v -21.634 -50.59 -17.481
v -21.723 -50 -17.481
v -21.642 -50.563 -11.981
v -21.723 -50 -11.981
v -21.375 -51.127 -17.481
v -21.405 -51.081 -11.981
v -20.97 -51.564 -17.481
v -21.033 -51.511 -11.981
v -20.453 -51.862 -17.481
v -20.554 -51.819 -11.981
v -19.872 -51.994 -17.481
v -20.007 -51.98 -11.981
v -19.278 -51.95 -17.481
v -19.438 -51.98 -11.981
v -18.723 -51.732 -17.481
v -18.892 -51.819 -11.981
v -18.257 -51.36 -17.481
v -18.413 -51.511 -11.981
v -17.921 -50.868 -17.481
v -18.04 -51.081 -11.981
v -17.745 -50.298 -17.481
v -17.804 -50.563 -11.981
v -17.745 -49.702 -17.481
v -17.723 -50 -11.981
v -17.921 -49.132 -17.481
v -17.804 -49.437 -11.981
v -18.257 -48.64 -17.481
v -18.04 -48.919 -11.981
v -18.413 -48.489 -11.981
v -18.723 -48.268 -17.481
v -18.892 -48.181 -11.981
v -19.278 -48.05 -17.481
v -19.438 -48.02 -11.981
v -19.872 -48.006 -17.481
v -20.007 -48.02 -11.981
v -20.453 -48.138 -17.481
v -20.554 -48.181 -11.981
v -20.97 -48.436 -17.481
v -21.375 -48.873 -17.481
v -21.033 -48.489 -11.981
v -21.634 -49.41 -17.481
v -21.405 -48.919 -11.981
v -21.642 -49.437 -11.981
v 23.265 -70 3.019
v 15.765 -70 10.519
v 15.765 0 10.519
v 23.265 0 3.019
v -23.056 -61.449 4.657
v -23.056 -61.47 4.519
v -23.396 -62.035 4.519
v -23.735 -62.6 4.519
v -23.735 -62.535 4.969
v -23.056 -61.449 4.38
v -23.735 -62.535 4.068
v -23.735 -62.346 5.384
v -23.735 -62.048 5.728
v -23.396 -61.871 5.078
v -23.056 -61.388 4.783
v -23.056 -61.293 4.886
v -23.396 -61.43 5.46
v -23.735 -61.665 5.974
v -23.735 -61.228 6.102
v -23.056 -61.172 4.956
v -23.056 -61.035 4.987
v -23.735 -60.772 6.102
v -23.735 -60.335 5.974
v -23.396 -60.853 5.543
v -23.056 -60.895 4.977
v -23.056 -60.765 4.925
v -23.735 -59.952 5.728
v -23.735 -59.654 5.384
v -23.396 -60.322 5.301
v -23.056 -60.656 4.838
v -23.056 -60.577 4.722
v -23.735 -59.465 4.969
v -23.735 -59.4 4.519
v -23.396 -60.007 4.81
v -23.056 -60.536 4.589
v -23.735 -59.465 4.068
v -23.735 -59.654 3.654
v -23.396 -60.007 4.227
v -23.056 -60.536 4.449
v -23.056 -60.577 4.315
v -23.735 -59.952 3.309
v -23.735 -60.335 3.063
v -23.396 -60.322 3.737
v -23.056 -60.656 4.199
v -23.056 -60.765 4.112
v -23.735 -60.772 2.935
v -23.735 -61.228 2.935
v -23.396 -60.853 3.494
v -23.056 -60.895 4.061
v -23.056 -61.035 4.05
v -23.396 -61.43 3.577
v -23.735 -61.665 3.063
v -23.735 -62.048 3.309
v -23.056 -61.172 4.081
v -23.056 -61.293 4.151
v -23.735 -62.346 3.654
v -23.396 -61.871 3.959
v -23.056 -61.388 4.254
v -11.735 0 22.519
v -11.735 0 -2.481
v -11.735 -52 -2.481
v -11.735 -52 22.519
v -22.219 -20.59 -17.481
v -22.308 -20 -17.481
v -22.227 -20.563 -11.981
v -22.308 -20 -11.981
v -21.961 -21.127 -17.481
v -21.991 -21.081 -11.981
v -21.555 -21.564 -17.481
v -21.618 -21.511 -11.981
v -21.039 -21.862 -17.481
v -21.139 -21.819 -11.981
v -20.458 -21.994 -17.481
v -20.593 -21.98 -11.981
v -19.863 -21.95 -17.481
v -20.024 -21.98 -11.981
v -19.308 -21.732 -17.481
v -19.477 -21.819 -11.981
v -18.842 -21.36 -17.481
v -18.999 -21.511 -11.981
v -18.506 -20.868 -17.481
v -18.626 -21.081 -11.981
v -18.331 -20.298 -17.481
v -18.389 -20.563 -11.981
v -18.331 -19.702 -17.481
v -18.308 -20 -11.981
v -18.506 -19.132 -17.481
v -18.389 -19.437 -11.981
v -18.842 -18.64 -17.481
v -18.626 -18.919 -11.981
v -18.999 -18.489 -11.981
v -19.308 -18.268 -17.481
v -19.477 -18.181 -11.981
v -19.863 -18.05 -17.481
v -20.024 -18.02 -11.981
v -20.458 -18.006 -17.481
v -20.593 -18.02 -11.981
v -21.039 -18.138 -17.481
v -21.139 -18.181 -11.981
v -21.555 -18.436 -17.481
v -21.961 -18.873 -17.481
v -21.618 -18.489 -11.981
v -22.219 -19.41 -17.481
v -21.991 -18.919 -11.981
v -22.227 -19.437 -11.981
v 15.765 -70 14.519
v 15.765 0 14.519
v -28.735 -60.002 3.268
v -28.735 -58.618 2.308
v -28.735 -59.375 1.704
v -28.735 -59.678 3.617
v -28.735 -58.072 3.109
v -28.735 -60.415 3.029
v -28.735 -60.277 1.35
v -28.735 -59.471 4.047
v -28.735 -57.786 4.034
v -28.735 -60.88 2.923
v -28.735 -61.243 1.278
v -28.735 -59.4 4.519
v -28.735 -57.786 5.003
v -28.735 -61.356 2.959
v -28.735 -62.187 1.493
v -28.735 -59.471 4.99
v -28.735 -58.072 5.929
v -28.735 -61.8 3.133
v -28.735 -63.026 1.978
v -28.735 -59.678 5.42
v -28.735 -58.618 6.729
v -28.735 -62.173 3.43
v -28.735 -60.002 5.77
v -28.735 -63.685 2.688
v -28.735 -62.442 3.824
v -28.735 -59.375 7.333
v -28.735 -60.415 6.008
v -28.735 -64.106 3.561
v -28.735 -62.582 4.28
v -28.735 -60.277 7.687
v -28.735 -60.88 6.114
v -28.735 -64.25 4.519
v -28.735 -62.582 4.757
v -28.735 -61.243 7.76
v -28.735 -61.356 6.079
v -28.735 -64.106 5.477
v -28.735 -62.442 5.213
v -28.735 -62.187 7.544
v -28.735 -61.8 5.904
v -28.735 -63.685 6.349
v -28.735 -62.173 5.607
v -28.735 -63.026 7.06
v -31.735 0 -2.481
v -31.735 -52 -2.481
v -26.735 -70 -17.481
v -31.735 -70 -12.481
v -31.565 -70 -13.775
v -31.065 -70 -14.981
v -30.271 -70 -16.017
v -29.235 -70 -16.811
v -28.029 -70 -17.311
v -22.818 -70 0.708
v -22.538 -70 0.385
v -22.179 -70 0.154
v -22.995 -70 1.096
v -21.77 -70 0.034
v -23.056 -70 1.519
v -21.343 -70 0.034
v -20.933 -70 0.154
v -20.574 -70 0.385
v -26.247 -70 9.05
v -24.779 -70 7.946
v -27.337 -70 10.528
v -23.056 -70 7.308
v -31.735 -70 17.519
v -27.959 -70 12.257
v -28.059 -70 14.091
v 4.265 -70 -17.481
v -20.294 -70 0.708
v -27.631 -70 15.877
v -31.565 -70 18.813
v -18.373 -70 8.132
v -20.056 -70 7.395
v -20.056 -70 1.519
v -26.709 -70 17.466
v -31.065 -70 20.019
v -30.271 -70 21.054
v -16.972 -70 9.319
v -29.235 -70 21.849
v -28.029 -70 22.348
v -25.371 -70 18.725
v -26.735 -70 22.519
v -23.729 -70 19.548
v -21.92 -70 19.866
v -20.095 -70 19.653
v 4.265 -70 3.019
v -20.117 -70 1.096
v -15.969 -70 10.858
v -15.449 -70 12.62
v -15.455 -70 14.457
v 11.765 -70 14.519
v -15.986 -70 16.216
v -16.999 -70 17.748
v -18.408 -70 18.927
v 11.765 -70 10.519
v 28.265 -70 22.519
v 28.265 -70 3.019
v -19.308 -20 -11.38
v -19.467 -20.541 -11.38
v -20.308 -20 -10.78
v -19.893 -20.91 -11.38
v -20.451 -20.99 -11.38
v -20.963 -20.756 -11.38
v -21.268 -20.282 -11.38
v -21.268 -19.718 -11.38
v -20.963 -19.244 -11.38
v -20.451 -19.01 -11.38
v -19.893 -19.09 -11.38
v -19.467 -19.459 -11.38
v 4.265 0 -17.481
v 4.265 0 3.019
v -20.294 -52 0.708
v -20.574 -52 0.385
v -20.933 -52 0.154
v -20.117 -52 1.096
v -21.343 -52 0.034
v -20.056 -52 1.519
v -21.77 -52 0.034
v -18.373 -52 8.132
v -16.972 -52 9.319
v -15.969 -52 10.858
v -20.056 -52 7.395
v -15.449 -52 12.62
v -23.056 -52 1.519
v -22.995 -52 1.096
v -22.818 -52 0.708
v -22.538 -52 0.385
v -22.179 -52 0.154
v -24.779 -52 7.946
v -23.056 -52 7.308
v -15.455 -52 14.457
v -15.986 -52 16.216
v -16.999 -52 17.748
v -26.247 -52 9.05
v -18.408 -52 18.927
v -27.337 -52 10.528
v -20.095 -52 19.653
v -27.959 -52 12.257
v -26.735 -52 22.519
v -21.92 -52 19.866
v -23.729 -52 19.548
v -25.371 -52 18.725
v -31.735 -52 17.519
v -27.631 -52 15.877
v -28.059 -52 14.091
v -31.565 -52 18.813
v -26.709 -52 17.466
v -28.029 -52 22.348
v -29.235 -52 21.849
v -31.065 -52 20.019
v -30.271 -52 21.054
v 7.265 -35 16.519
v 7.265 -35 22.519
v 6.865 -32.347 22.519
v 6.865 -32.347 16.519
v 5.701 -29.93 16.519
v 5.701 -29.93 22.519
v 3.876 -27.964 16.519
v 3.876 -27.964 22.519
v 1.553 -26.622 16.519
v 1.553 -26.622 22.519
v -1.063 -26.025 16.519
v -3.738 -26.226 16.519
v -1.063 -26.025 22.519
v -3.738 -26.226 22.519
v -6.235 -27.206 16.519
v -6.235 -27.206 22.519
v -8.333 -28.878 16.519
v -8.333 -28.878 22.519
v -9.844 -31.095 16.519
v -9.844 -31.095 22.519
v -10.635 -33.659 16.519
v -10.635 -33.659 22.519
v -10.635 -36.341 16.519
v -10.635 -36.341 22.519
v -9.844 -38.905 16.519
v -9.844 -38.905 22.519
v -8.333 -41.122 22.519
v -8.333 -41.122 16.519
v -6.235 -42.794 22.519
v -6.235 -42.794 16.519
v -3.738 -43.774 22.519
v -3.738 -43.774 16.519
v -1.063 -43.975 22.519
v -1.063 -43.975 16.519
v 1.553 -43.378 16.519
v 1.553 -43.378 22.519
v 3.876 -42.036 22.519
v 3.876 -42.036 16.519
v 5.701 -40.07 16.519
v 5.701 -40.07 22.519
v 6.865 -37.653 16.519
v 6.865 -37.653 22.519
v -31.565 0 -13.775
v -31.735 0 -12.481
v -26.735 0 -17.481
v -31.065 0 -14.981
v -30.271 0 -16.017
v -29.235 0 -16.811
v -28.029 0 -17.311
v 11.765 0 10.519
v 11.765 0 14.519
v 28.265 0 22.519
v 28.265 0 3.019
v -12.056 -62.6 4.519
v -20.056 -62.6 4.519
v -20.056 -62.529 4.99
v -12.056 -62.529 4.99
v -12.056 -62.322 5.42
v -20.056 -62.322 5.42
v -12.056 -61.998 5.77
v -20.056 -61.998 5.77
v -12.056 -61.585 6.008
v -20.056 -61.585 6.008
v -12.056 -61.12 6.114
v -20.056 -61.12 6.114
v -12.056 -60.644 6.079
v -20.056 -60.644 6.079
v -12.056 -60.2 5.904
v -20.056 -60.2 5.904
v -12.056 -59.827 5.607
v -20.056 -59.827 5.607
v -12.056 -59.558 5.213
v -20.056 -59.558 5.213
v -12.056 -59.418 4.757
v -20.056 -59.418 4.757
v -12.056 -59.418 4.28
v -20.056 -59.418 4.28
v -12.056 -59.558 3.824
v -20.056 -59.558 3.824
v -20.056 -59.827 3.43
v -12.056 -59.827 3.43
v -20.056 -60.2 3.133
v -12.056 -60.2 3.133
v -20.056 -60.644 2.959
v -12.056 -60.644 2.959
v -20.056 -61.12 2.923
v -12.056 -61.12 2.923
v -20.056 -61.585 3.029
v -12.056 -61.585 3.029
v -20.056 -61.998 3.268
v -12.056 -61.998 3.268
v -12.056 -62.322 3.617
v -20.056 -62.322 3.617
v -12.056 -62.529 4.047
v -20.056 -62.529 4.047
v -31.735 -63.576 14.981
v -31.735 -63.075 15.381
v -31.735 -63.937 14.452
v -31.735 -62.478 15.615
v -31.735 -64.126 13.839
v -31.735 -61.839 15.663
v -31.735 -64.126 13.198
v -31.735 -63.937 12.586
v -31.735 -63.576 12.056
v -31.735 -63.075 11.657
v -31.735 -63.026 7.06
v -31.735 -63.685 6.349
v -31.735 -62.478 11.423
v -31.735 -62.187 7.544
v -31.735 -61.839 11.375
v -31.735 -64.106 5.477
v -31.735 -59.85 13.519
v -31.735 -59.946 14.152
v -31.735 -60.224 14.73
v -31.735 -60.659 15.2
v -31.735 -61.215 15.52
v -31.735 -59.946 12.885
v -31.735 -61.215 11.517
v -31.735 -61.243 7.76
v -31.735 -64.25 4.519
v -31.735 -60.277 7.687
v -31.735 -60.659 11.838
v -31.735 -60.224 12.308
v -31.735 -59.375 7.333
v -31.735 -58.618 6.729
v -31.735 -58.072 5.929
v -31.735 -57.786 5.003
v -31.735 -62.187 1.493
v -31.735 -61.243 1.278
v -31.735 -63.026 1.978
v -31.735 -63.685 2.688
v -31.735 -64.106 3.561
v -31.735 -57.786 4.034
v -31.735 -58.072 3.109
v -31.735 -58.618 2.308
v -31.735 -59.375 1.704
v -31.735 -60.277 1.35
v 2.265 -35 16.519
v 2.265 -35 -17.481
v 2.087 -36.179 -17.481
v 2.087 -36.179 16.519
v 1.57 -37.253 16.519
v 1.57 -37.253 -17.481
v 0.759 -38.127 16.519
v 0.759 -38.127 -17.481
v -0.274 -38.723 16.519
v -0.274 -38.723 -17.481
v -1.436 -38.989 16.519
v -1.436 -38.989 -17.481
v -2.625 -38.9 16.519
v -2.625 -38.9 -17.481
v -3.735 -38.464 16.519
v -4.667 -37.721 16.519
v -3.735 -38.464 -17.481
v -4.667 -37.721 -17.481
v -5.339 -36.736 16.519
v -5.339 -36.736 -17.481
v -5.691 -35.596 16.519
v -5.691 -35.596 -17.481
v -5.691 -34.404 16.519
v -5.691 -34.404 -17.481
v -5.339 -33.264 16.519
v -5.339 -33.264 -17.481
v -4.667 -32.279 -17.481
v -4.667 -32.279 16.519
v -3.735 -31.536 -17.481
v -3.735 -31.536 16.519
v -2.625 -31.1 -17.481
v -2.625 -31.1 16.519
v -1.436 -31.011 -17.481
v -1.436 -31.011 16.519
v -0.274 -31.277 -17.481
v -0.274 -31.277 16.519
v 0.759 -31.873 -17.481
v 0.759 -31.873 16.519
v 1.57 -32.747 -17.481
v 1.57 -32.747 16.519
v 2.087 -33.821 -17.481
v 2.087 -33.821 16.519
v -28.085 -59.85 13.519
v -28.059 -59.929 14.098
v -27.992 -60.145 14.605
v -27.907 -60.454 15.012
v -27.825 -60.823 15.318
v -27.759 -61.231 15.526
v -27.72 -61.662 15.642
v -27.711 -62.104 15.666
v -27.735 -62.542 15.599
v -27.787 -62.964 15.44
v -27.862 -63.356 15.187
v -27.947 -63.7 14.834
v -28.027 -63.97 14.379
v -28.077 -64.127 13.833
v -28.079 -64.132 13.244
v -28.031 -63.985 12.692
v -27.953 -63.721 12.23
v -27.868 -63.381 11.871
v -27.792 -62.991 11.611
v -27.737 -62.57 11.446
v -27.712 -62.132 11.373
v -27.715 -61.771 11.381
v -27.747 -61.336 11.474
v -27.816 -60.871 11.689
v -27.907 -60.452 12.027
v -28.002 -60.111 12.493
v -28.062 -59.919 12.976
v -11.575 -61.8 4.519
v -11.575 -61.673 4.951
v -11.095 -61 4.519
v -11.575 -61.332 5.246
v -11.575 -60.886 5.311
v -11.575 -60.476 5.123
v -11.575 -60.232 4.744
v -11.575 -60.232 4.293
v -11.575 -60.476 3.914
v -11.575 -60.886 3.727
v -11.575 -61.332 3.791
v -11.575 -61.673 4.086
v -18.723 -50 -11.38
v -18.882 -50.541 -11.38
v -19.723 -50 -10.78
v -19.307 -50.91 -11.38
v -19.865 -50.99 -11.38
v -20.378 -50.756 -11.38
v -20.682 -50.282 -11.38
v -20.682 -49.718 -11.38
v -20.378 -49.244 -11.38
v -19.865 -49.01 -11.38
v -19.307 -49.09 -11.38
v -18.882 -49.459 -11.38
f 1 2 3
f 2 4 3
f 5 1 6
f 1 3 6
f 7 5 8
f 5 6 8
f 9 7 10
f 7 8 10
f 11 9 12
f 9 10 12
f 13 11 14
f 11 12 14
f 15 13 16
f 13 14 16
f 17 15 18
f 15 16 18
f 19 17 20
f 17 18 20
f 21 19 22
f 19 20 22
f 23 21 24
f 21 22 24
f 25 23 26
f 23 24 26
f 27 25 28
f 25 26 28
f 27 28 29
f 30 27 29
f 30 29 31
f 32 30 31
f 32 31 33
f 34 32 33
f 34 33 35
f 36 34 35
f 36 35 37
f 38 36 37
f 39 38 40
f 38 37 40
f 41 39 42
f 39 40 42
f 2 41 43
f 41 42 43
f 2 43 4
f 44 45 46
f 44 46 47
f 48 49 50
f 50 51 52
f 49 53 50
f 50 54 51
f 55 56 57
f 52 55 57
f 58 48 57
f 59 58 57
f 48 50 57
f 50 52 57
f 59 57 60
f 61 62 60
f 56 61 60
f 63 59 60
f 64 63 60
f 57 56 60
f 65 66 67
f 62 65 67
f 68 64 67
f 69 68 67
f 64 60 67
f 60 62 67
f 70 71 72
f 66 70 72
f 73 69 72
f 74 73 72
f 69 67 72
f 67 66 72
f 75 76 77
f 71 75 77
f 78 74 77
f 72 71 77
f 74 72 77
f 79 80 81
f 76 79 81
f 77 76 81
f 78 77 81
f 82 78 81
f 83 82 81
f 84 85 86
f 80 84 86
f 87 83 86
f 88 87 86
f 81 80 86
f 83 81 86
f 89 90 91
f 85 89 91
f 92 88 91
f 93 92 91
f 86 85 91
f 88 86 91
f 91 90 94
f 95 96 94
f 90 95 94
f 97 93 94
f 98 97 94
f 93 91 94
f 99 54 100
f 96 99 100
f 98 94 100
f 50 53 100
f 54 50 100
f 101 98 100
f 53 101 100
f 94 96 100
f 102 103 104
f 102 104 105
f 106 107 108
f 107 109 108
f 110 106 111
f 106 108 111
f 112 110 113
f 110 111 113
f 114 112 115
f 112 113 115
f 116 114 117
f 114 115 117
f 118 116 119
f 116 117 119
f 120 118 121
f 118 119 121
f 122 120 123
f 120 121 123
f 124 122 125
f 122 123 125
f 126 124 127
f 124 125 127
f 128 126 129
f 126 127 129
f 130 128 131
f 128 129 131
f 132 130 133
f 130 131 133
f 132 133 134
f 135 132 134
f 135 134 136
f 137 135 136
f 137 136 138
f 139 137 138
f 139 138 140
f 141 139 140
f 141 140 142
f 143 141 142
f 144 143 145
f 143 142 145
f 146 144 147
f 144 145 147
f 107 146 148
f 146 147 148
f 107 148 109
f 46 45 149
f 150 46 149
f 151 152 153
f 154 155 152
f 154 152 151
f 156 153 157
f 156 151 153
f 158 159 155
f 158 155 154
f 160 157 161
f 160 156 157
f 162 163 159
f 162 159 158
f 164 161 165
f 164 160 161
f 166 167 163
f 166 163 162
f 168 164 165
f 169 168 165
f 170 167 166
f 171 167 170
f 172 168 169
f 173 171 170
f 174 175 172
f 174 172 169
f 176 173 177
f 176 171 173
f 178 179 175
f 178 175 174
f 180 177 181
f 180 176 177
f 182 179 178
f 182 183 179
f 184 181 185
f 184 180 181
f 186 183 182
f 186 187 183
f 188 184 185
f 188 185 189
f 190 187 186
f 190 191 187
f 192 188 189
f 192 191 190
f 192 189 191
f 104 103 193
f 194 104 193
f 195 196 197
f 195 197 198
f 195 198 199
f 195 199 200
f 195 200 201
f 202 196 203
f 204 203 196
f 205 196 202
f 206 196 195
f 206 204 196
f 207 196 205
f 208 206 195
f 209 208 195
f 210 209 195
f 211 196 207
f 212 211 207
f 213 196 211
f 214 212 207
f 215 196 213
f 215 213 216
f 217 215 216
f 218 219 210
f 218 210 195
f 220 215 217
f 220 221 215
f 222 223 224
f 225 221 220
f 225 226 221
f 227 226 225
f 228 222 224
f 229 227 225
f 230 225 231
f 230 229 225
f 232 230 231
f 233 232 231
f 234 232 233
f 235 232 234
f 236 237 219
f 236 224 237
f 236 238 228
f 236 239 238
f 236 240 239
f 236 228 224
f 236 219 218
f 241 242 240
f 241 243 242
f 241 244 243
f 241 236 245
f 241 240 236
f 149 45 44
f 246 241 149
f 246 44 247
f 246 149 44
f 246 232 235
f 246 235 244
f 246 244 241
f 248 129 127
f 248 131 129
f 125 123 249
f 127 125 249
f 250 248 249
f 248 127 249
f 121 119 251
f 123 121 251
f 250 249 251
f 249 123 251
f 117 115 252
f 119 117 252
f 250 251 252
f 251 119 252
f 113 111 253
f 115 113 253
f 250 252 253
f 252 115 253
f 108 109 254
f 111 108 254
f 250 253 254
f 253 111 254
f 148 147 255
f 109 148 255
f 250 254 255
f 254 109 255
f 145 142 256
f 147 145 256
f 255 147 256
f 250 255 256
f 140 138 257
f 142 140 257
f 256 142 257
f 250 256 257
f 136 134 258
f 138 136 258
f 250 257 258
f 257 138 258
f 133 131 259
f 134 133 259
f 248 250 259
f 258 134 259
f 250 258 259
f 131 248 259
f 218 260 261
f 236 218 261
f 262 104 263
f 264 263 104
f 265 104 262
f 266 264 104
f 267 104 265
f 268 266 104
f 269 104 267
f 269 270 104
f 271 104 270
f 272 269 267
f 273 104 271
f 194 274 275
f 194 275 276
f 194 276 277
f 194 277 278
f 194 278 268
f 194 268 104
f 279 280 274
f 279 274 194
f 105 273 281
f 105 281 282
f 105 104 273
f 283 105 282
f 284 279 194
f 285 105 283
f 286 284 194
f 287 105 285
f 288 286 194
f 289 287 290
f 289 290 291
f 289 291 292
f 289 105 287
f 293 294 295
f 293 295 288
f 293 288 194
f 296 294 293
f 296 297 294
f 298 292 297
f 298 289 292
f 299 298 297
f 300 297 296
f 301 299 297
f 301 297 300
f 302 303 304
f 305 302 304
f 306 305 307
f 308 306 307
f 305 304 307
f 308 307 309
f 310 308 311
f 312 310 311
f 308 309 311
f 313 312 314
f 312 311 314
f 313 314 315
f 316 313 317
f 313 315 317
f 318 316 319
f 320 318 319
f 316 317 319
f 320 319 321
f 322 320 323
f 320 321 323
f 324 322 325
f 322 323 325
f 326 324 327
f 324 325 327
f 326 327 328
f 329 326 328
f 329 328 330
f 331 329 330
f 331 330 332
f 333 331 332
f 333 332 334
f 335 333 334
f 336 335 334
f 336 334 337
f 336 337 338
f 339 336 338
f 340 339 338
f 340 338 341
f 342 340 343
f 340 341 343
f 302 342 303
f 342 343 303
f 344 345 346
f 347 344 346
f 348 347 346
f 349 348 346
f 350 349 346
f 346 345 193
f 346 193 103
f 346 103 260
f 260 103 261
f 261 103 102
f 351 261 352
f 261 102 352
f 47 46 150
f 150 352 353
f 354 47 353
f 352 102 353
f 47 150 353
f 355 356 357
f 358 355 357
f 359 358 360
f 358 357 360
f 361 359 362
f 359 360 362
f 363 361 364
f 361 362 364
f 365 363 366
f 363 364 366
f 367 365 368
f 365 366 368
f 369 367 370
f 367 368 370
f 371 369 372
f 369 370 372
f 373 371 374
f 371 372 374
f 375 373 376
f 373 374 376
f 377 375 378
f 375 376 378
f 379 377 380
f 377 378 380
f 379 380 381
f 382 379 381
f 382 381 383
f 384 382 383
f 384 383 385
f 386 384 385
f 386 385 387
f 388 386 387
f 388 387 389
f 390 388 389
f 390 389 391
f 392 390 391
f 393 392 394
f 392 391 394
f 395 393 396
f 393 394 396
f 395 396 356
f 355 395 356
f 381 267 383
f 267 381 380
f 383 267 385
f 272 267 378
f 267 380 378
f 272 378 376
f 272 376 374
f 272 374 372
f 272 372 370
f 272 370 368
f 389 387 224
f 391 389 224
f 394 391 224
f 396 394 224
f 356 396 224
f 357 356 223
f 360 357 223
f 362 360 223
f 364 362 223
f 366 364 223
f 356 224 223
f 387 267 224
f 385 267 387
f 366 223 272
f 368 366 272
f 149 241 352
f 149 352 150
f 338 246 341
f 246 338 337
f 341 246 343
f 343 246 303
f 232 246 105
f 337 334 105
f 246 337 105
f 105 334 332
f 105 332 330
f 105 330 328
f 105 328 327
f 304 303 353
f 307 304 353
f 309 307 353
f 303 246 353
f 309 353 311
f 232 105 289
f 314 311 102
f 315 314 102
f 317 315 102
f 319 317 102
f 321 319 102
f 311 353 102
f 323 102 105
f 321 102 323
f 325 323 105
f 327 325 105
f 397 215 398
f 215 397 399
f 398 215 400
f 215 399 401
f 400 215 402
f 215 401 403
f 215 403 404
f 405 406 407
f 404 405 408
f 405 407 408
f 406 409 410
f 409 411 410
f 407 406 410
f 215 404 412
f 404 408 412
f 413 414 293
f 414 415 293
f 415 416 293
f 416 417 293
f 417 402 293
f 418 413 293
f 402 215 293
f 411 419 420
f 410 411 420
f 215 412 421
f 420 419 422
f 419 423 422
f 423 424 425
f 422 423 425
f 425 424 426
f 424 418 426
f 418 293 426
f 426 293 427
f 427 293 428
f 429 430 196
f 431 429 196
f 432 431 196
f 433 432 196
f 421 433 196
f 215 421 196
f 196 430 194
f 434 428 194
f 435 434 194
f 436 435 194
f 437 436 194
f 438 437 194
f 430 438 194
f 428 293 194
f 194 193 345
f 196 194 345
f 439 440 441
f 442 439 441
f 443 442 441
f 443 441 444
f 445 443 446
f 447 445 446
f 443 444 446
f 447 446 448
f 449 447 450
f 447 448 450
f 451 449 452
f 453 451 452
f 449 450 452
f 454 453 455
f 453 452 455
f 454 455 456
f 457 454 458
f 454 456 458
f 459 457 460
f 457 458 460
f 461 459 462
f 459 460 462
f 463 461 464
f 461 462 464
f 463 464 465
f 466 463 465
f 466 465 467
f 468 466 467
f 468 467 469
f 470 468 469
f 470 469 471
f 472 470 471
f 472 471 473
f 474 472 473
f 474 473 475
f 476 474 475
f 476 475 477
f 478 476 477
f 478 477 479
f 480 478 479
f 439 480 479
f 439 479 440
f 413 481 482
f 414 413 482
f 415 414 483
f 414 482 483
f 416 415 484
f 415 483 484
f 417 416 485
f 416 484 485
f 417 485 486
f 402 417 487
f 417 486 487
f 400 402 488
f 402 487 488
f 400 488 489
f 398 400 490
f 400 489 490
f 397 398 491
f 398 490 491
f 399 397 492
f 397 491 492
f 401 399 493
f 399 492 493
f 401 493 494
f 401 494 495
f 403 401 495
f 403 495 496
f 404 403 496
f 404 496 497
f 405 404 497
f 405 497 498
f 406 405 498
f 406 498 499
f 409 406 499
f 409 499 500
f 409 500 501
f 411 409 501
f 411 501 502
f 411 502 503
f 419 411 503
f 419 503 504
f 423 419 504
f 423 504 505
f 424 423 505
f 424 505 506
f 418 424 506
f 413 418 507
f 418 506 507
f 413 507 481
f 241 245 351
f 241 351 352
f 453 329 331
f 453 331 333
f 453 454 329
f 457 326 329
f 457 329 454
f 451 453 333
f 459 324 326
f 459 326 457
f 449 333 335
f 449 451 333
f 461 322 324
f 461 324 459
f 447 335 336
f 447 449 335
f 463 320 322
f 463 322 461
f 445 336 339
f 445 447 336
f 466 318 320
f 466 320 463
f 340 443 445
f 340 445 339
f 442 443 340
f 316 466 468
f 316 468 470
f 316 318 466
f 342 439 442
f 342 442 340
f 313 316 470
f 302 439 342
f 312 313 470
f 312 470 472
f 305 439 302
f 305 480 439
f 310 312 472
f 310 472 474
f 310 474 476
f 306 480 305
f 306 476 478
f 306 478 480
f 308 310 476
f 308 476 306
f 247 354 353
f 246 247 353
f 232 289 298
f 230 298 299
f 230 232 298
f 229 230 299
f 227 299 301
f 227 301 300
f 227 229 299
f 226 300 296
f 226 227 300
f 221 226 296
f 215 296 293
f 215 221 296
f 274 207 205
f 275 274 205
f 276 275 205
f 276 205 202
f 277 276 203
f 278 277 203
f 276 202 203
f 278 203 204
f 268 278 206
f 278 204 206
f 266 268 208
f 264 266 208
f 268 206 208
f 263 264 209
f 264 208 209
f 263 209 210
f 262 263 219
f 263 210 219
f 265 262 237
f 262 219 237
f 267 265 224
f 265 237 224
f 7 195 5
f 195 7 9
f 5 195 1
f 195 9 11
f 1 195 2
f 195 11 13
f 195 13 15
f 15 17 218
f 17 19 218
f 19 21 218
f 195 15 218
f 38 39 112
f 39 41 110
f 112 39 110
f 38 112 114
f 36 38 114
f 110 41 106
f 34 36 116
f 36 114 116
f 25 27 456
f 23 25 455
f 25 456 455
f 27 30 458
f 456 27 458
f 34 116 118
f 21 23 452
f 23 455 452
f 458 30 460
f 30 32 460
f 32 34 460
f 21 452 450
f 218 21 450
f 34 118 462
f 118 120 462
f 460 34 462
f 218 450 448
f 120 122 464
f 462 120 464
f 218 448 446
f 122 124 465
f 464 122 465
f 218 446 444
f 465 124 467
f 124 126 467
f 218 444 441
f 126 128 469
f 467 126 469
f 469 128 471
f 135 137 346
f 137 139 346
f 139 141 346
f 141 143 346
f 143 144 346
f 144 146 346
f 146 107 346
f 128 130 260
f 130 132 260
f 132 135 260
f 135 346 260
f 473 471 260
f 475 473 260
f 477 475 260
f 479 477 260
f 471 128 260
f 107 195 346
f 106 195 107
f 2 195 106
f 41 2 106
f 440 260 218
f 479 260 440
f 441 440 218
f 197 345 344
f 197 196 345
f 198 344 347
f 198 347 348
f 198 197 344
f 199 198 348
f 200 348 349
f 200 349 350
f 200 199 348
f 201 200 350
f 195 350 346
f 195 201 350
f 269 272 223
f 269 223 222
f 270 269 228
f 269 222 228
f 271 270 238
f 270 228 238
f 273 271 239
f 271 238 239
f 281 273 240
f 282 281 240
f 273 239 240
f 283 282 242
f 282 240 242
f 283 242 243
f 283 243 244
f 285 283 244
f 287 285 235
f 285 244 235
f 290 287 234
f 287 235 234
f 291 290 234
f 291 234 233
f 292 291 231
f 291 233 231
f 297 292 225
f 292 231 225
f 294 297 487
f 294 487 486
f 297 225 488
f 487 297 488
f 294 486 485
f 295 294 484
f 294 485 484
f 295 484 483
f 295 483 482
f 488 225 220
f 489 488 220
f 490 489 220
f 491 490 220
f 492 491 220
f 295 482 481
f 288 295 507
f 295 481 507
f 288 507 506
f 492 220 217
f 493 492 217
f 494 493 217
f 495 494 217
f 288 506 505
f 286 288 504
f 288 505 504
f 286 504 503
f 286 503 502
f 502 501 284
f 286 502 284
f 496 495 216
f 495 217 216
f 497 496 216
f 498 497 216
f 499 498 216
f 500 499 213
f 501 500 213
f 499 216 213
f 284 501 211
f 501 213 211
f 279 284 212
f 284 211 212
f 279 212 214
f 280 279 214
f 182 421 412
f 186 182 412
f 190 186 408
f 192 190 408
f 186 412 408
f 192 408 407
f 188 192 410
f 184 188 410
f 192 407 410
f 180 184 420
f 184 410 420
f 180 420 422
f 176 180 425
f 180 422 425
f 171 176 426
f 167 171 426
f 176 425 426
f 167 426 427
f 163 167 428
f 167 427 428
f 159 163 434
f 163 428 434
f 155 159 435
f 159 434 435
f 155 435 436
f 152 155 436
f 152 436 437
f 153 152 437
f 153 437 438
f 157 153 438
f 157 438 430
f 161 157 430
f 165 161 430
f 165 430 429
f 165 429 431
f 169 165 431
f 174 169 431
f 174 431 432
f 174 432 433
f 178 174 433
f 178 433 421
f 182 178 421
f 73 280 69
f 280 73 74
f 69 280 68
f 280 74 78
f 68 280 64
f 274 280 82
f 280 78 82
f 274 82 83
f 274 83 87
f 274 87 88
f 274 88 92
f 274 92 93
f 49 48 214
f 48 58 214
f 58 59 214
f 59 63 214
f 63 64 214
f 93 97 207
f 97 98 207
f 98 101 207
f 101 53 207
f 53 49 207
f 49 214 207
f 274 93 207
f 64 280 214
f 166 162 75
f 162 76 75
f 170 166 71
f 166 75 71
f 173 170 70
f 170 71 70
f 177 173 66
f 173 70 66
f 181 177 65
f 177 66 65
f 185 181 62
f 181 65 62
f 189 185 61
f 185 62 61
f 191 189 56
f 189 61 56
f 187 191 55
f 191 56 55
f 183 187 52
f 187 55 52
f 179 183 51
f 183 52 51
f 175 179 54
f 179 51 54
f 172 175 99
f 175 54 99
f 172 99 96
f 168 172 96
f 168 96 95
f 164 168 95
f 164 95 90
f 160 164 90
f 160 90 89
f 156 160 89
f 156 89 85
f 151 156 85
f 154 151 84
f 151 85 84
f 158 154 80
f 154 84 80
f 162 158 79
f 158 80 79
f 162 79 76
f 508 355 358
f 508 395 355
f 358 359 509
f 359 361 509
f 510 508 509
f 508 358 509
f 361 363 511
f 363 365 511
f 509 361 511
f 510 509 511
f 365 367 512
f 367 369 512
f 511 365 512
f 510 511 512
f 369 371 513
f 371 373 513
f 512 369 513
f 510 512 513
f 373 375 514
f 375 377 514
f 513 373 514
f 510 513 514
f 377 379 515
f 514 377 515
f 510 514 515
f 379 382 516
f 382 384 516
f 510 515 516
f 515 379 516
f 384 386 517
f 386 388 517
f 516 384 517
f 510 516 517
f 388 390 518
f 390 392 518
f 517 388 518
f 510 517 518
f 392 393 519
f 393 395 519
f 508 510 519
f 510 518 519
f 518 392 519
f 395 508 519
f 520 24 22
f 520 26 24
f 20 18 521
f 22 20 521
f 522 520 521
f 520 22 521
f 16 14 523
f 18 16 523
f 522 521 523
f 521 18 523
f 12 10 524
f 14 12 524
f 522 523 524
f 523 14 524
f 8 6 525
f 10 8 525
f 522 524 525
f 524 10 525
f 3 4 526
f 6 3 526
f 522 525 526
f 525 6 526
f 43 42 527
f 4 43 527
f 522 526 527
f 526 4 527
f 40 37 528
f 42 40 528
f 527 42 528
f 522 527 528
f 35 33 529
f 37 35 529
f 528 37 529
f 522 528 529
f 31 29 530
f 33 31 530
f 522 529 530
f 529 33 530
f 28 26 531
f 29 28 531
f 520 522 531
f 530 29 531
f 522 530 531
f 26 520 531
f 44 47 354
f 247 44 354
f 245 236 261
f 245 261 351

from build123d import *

# Parameters (mm, degrees)
F1_DEPTH        = 70
F2_W            = 28.213582236
F2_H            = 30.1489157287
F3_DEPTH        = 52
F4_R            = 5
F6_DEPTH        = 18
F7_W            = 4
F7_H            = 4
F8_DEPTH        = 70.001
F9_R            = 4
F10_DEPTH       = 40.001
F11_R           = 9
F12_DEPTH       = 6
F14_D           = 4
F14_DEPTH       = 5.5
F14_TIP         = 1.2017212381
F17_D           = 3.2
F17_DEPTH       = 8
F17_CBORE_D     = 6.5
F17_CBORE_DEPTH = 3
F17_TIP         = 0.9613769904
F18_D           = 3.2
F18_DEPTH       = 8
F18_TIP         = 0.9613769904
F19_D           = 4.3
F19_DEPTH       = 8
F19_TIP         = 1.2918503309


with BuildPart() as f1:
    # F0 (on Front) → F1 (new body)
    with BuildSketch(Plane.XZ):
        Polygon((28.2647607103, 22.518672328), (-31.7352392897, 22.518672328), (-31.7352392897, -17.481327672), (4.2647607103, -17.481327672), (4.2647607103, -9.1914124787), (4.2647607103, 3.018672328), (13.7647607103, 12.518672328), (23.2647607103, 3.018672328), (28.2647607103, 3.018672328), align=None)
    extrude(amount=F1_DEPTH)

    # F2 (on face) → F3 (cut)
    with BuildSketch(Plane(origin=(0, 0, 0), x_dir=(-1, 0, 0), z_dir=(0, 1, 0))):
        with Locations((25.8420304077, 12.5931301923)):
            Rectangle(F2_W, F2_H)
    extrude(amount=-F3_DEPTH, mode=Mode.SUBTRACT)

    # F4
    f4_edges = [f1.edges().sort_by_distance(p)[0] for p in [
        (-31.735239, -61, 22.518672),
        (-31.735239, -35, -17.481328),
    ]]
    fillet(f4_edges, radius=F4_R)

    # F5 (on face) → F6 (cut, through all)
    with BuildSketch(Plane.XZ.offset(70)):
        with BuildLine():
            Line((-20.0560601684, 1.518672328), (-20.0560601684, 7.3947146633))
            ThreePointArc((-20.0560601684, 7.3947146633), (-21.9196415591, 19.8659942674), (-23.0560601684, 7.3075587236))
            Line((-23.0560601684, 7.3075587236), (-23.0560601684, 1.518672328))
            ThreePointArc((-23.0560601684, 1.518672328), (-21.5560601684, 0.018672328), (-20.0560601684, 1.518672328))
        make_face()
    extrude(amount=-F6_DEPTH, mode=Mode.SUBTRACT)

    # F7 (on face) → F8 (cut, through all)
    with BuildSketch(Plane.XZ.offset(70)):
        with Locations((13.7647607103, 12.518672328)):
            Rectangle(F7_W, F7_H)
    extrude(amount=-F8_DEPTH, mode=Mode.SUBTRACT)

    # F9 (on face) → F10 (cut, through all)
    with BuildSketch(Plane(origin=(0, 0, -17.481327672), x_dir=(1, 0, 0), z_dir=(0, 0, -1))):
        with Locations((-1.7352392897, 35)):
            Circle(F9_R)
    extrude(amount=-F10_DEPTH, mode=Mode.SUBTRACT)

    # F11 (on face) → F12 (cut)
    with BuildSketch(Plane.XY.offset(22.518672328)):
        with Locations((-1.7352392897, -35)):
            Circle(F11_R)
    extrude(amount=-F12_DEPTH, mode=Mode.SUBTRACT)

    # F14
    with Locations(Plane(origin=(0, 0, -17.481327672), x_dir=(1, 0, 0), z_dir=(0, 0, -1))):
        with Locations((-19.7227925898, 50), (-20.3082847504, 20)):
            Hole(F14_D / 2, depth=F14_DEPTH)
            with Locations((0, 0, -(F14_DEPTH + F14_TIP / 2))):  # 118° drill point
                Cone(0, F14_D / 2, F14_TIP, mode=Mode.SUBTRACT)

    # F17
    with Locations(Plane(origin=(-31.7352392897, 0, 0), x_dir=(0, -1, 0), z_dir=(-1, 0, 0))):
        with Locations((61, 4.518672328)):
            CounterBoreHole(F17_D / 2, F17_CBORE_D / 2, F17_CBORE_DEPTH, depth=F17_DEPTH)
            with Locations((0, 0, -(F17_DEPTH + F17_TIP / 2))):  # 118° drill point
                Cone(0, F17_D / 2, F17_TIP, mode=Mode.SUBTRACT)

    # F18 (one way)
    with BuildSketch(Plane(origin=(-20.0560601684, 0, 0), x_dir=(0, -1, 0), z_dir=(-1, 0, 0))):
        with Locations((61, 4.518672328)):
            Circle(F18_D / 2)
    extrude(amount=-F18_DEPTH, mode=Mode.SUBTRACT)
    with Locations(Plane(origin=(-20.0560601684, 0, 0), x_dir=(0, -1, 0), z_dir=(-1, 0, 0))):
        with Locations((61, 4.518672328)):
            with Locations((0, 0, -(F18_DEPTH + F18_TIP / 2))):  # 118° drill point
                Cone(0, F18_D / 2, F18_TIP, mode=Mode.SUBTRACT)

    # F19
    with Locations(Plane(origin=(-31.7352392897, 0, 0), x_dir=(0, -1, 0), z_dir=(-1, 0, 0))):
        with Locations((62, 13.518672328)):
            Hole(F19_D / 2, depth=F19_DEPTH)
            with Locations((0, 0, -(F19_DEPTH + F19_TIP / 2))):  # 118° drill point
                Cone(0, F19_D / 2, F19_TIP, mode=Mode.SUBTRACT)


solid = f1.part
